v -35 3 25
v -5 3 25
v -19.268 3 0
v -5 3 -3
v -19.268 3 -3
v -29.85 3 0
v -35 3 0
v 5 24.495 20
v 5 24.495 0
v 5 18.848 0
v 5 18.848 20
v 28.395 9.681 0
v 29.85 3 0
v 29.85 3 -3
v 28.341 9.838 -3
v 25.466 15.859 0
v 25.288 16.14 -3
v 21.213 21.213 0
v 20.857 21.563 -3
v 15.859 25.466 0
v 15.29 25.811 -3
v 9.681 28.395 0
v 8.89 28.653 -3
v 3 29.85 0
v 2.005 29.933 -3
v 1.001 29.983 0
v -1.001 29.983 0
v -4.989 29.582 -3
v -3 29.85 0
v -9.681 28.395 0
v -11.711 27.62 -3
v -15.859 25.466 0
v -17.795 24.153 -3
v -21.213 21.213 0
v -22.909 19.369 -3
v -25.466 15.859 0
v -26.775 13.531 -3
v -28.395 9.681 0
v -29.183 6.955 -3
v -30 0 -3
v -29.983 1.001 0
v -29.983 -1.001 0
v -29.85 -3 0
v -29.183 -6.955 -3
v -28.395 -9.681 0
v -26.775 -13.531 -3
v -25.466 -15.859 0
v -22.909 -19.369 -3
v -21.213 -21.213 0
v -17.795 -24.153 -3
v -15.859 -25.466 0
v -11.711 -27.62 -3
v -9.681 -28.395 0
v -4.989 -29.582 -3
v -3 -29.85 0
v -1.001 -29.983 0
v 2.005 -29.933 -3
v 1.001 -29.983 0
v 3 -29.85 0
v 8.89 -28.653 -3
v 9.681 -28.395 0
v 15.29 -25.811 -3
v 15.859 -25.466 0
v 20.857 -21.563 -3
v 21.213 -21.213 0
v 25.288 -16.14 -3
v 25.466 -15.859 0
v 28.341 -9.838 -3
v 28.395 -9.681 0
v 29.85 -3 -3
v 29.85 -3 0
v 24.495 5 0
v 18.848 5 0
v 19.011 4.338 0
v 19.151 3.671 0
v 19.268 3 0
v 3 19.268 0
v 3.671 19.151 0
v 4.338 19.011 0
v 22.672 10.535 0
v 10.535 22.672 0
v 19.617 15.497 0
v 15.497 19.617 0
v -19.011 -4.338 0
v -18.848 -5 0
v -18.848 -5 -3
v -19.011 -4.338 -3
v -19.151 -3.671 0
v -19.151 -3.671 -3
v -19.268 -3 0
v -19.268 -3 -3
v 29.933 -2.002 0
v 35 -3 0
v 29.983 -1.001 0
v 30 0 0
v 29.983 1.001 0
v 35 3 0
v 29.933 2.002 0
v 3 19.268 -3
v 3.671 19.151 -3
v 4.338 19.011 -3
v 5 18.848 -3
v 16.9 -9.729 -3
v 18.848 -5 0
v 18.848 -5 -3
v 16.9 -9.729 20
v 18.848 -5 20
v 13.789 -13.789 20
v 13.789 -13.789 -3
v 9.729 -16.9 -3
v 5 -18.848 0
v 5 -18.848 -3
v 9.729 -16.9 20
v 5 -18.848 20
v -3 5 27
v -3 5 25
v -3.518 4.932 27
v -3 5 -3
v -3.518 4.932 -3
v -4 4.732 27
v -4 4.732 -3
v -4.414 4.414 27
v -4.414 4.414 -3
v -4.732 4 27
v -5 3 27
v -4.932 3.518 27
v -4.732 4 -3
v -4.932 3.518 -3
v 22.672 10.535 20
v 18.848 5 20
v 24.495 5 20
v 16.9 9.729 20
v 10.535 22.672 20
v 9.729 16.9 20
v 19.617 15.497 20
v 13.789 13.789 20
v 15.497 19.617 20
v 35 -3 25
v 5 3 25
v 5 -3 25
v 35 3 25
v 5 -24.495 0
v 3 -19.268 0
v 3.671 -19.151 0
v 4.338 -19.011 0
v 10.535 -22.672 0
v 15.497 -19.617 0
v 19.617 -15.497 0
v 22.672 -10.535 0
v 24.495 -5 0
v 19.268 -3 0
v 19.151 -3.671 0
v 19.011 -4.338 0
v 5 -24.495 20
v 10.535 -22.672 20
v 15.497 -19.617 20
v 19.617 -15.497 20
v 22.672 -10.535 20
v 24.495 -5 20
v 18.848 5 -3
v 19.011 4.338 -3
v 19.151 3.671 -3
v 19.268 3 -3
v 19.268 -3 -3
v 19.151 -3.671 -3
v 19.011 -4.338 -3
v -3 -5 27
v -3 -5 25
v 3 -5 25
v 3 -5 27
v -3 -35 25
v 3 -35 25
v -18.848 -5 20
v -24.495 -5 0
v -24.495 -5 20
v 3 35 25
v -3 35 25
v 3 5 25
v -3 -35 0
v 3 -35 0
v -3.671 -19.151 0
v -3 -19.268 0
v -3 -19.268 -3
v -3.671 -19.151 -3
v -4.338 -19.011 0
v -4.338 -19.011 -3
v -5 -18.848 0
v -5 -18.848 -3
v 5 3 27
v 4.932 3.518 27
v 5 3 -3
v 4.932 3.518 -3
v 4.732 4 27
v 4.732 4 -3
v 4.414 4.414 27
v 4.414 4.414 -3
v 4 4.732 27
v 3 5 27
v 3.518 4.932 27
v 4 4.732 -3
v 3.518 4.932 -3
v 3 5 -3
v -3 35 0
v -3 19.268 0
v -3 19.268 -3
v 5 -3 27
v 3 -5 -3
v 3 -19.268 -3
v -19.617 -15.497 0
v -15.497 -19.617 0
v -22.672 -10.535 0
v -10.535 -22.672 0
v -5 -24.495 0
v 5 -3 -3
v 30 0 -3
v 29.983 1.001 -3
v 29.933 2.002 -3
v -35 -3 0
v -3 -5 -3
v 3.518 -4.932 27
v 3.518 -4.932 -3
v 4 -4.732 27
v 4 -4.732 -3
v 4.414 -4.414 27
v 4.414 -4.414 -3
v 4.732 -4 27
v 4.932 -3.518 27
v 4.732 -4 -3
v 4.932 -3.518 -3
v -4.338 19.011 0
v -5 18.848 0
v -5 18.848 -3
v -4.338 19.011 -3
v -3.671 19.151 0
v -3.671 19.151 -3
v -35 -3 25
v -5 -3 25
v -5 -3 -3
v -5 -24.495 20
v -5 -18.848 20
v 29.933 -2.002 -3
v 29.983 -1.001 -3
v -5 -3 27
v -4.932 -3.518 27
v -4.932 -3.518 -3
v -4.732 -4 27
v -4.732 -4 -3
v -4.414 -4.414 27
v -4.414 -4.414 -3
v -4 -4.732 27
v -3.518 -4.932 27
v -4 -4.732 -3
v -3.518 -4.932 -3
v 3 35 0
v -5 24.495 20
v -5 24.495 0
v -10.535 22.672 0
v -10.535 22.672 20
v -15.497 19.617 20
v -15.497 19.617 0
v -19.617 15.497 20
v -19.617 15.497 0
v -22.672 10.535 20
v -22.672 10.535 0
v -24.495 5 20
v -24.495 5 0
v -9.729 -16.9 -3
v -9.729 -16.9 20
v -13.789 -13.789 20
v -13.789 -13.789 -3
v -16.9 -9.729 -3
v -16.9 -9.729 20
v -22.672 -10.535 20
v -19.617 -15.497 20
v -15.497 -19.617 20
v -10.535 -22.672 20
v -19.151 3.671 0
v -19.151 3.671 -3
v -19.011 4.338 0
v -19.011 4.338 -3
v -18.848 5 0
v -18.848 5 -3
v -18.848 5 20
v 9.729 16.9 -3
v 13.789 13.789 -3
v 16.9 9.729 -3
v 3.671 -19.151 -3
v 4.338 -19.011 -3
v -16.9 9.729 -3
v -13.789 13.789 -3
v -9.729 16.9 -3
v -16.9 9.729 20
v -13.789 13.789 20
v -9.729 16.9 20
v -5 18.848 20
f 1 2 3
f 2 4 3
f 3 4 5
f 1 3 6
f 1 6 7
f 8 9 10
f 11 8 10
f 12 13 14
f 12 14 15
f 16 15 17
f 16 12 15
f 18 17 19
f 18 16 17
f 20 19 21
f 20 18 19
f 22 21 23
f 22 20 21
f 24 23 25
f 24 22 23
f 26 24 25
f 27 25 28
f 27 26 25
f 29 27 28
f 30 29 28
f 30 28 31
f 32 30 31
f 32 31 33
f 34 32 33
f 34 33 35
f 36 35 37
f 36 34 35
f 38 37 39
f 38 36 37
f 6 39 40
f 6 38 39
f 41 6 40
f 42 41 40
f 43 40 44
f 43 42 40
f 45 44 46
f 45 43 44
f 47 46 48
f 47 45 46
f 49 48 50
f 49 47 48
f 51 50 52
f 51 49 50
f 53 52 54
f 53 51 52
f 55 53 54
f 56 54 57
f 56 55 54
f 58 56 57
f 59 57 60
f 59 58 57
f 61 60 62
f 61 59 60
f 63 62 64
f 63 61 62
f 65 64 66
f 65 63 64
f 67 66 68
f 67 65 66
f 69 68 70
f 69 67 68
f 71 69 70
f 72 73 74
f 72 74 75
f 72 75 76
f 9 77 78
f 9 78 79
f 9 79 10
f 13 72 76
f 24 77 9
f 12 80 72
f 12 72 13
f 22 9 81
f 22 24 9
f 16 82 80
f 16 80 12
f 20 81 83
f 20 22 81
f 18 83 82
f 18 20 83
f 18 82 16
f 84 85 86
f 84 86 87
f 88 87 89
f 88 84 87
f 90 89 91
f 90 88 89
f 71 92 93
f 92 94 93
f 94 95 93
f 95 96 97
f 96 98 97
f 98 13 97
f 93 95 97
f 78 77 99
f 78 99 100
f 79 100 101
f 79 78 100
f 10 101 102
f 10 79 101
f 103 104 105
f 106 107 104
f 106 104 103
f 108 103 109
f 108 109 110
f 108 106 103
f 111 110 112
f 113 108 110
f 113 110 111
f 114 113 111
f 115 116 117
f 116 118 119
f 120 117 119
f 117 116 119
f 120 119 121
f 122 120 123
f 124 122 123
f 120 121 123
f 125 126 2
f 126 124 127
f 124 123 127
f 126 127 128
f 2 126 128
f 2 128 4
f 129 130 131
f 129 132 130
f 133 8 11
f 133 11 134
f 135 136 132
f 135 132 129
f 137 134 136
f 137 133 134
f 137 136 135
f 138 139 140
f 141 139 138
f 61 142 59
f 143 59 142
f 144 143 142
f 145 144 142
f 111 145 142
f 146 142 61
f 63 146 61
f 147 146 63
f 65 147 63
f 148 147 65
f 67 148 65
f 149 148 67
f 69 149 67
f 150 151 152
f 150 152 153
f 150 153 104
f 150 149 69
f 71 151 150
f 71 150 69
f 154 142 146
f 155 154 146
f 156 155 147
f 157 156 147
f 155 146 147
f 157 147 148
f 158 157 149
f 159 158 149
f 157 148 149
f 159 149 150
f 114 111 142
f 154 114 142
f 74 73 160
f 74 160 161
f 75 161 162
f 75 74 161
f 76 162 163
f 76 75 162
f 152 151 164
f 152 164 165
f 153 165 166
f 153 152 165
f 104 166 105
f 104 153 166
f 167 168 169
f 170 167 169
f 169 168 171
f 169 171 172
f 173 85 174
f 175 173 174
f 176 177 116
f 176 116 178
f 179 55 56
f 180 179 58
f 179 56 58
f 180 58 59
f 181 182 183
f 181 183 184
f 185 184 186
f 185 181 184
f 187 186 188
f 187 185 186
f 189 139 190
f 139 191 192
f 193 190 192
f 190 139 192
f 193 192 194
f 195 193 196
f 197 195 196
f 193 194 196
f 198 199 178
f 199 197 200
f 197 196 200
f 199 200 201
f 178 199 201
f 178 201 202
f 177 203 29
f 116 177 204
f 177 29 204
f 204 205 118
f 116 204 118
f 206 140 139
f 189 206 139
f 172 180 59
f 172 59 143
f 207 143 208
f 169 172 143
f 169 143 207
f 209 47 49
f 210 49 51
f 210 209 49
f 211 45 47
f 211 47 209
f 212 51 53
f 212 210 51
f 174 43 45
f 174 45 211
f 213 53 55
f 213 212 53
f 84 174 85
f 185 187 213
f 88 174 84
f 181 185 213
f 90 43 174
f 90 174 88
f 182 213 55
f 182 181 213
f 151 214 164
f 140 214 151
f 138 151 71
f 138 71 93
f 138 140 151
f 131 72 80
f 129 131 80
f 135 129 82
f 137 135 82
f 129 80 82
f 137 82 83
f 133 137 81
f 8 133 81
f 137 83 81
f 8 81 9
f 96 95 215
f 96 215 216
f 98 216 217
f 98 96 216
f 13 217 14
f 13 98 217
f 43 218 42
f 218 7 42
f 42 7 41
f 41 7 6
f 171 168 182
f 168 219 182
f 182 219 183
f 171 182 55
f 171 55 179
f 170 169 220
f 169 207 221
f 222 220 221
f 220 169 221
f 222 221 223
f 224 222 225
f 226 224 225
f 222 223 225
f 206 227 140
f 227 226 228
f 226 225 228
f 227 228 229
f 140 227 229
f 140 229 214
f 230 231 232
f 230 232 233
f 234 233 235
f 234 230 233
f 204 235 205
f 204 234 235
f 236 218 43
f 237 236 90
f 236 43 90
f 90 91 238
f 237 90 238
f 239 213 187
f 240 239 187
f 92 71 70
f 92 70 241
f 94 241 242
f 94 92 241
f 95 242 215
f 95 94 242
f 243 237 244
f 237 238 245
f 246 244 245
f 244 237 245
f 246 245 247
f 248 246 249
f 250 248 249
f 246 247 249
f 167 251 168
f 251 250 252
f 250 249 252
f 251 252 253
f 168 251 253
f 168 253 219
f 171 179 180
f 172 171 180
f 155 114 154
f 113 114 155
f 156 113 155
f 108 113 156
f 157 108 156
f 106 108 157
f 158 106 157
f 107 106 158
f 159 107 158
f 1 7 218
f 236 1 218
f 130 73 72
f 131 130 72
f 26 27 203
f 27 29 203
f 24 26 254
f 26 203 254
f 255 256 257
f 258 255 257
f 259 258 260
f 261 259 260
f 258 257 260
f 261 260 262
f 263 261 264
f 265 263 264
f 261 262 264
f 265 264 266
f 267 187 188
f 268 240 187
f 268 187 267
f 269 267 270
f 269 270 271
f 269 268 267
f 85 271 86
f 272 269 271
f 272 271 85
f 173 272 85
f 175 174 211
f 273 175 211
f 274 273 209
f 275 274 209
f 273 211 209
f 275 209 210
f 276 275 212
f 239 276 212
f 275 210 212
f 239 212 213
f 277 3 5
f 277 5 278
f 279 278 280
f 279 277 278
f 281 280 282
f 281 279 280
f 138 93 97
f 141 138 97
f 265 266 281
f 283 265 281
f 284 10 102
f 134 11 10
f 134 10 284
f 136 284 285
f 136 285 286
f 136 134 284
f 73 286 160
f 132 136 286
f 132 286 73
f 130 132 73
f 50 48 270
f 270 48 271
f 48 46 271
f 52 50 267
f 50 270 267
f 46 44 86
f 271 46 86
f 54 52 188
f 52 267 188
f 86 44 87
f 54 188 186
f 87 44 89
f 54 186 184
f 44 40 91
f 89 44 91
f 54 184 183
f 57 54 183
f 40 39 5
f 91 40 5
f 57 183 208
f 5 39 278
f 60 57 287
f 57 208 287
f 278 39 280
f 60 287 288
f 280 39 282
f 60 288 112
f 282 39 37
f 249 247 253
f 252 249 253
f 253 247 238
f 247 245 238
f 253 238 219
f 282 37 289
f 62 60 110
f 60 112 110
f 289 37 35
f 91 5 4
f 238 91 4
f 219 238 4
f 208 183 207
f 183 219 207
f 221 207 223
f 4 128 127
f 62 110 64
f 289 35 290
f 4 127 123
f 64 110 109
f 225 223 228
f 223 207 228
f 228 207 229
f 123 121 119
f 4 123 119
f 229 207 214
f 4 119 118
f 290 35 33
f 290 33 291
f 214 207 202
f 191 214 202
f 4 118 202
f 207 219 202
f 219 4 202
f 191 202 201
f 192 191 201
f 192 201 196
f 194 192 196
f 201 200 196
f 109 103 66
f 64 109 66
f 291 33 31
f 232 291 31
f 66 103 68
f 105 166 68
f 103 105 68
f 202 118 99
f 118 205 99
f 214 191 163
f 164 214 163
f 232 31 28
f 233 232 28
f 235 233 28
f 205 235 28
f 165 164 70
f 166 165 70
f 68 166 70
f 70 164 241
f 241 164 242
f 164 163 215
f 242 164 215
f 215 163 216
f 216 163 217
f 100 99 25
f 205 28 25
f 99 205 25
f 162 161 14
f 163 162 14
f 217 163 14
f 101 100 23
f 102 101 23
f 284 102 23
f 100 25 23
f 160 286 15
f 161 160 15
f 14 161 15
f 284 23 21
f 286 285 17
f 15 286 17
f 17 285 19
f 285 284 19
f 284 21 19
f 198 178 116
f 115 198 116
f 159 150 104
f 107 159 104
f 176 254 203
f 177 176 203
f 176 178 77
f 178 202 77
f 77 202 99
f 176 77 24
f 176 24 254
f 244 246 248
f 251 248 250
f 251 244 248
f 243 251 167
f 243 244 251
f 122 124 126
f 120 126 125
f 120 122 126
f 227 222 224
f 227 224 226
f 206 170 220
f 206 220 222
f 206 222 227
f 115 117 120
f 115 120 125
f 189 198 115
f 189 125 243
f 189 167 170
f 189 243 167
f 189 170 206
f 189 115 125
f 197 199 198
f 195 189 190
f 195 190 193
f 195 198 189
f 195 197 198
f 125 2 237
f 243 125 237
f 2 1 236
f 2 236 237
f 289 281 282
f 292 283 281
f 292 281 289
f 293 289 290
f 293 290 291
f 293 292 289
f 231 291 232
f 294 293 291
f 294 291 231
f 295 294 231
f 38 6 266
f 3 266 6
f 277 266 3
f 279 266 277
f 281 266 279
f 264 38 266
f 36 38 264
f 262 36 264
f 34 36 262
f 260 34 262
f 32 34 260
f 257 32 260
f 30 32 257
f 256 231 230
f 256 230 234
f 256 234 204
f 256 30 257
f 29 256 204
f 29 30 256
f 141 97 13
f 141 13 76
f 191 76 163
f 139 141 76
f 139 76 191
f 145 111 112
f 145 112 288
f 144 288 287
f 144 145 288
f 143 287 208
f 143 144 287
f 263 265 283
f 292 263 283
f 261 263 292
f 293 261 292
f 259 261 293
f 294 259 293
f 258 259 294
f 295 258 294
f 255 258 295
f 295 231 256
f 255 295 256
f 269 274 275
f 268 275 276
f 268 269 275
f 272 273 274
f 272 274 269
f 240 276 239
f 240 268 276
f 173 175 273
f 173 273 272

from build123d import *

# Parameters (mm, degrees)
F1_DEPTH = 3
F2_DEPTH = 20
F3_DEPTH = 25
F4_DEPTH = 27


with BuildPart() as f1:
    # F0 (on Top) → F1 (new body)
    with BuildSketch(Plane.XY):
        with BuildLine():
            Line((29.8496231132, -3), (24.819347292, -3))
            ThreePointArc((24.819347292, -3), (24.6773921449, -4.0032882645), (24.4948974278, -5))
            ThreePointArc((24.4948974278, -5), (17.6776695297, -17.6776695297), (5, -24.4948974278))
            ThreePointArc((5, -24.4948974278), (4.0032882645, -24.6773921449), (3, -24.819347292))
            Line((3, -24.819347292), (3, -29.8496231132))
            ThreePointArc((3, -29.8496231132), (21.2132034356, -21.2132034356), (29.8496231132, -3))
        make_face()
        with BuildLine():
            ThreePointArc((5, -24.4948974278), (17.6776695297, -17.6776695297), (24.4948974278, -5))
            Line((24.4948974278, -5), (18.848076825, -5))
            ThreePointArc((18.848076825, -5), (13.7885822331, -13.7885822331), (5, -18.848076825))
            Line((5, -18.848076825), (5, -24.4948974278))
        make_face()
        with BuildLine():
            ThreePointArc((24.4948974278, -5), (24.6773921449, -4.0032882645), (24.819347292, -3))
            Line((24.819347292, -3), (19.267848868, -3))
            ThreePointArc((19.267848868, -3), (19.0841805655, -4.0055027327), (18.848076825, -5))
            Line((18.848076825, -5), (24.4948974278, -5))
        make_face()
        with BuildLine():
            ThreePointArc((25, 0), (24.9547959549, 1.5027171558), (24.819347292, 3))
            Line((24.819347292, 3), (19.267848868, 3))
            ThreePointArc((19.267848868, 3), (19.4418755902, 1.5044844755), (19.5, 0))
            ThreePointArc((19.5, 0), (19.4418755902, -1.5044844755), (19.267848868, -3))
            Line((19.267848868, -3), (24.819347292, -3))
            ThreePointArc((24.819347292, -3), (24.9547959549, -1.5027171558), (25, 0))
        make_face()
        with BuildLine():
            ThreePointArc((24.819347292, 3), (24.6773921449, 4.0032882645), (24.4948974278, 5))
            Line((24.4948974278, 5), (18.848076825, 5))
            ThreePointArc((18.848076825, 5), (19.0841805655, 4.0055027327), (19.267848868, 3))
            Line((19.267848868, 3), (24.819347292, 3))
        make_face()
        with BuildLine():
            Line((18.848076825, 5), (24.4948974278, 5))
            ThreePointArc((24.4948974278, 5), (17.6776695297, 17.6776695297), (5, 24.4948974278))
            Line((5, 24.4948974278), (5, 18.848076825))
            ThreePointArc((5, 18.848076825), (13.7885822331, 13.7885822331), (18.848076825, 5))
        make_face()
        with BuildLine():
            ThreePointArc((5, 24.4948974278), (17.6776695297, 17.6776695297), (24.4948974278, 5))
            ThreePointArc((24.4948974278, 5), (24.6773921449, 4.0032882645), (24.819347292, 3))
            Line((24.819347292, 3), (29.8496231132, 3))
            ThreePointArc((29.8496231132, 3), (21.2132034356, 21.2132034356), (3, 29.8496231132))
            Line((3, 29.8496231132), (3, 24.819347292))
            ThreePointArc((3, 24.819347292), (4.0032882645, 24.6773921449), (5, 24.4948974278))
        make_face()
        with BuildLine():
            Line((29.8496231132, 3), (24.819347292, 3))
            ThreePointArc((24.819347292, 3), (24.9547959549, 1.5027171558), (25, 0))
            ThreePointArc((25, 0), (24.9547959549, -1.5027171558), (24.819347292, -3))
            Line((24.819347292, -3), (29.8496231132, -3))
            ThreePointArc((29.8496231132, -3), (29.9623821933, -1.5018832518), (30, 0))
            ThreePointArc((30, 0), (29.9623821933, 1.5018832518), (29.8496231132, 3))
        make_face()
        with BuildLine():
            ThreePointArc((-3, -29.8496231132), (0, -30), (3, -29.8496231132))
            Line((3, -29.8496231132), (3, -24.819347292))
            ThreePointArc((3, -24.819347292), (0, -25), (-3, -24.819347292))
            Line((-3, -24.819347292), (-3, -29.8496231132))
        make_face()
        with BuildLine():
            ThreePointArc((-3, -24.819347292), (0, -25), (3, -24.819347292))
            Line((3, -24.819347292), (3, -19.267848868))
            ThreePointArc((3, -19.267848868), (0, -19.5), (-3, -19.267848868))
            Line((-3, -19.267848868), (-3, -24.819347292))
        make_face()
        with BuildLine():
            ThreePointArc((3, -24.819347292), (4.0032882645, -24.6773921449), (5, -24.4948974278))
            Line((5, -24.4948974278), (5, -18.848076825))
            ThreePointArc((5, -18.848076825), (4.0055027327, -19.0841805655), (3, -19.267848868))
            Line((3, -19.267848868), (3, -24.819347292))
        make_face()
        with BuildLine():
            ThreePointArc((-5, -24.4948974278), (-4.0032882645, -24.6773921449), (-3, -24.819347292))
            Line((-3, -24.819347292), (-3, -19.267848868))
            ThreePointArc((-3, -19.267848868), (-4.0055027327, -19.0841805655), (-5, -18.848076825))
            Line((-5, -18.848076825), (-5, -24.4948974278))
        make_face()
        with BuildLine():
            Line((-24.819347292, -3), (-29.8496231132, -3))
            ThreePointArc((-29.8496231132, -3), (-21.2132034356, -21.2132034356), (-3, -29.8496231132))
            Line((-3, -29.8496231132), (-3, -24.819347292))
            ThreePointArc((-3, -24.819347292), (-4.0032882645, -24.6773921449), (-5, -24.4948974278))
            ThreePointArc((-5, -24.4948974278), (-17.6776695297, -17.6776695297), (-24.4948974278, -5))
            ThreePointArc((-24.4948974278, -5), (-24.6773921449, -4.0032882645), (-24.819347292, -3))
        make_face()
        with BuildLine():
            Line((-18.848076825, -5), (-24.4948974278, -5))
            ThreePointArc((-24.4948974278, -5), (-17.6776695297, -17.6776695297), (-5, -24.4948974278))
            Line((-5, -24.4948974278), (-5, -18.848076825))
            ThreePointArc((-5, -18.848076825), (-13.7885822331, -13.7885822331), (-18.848076825, -5))
        make_face()
        with BuildLine():
            Line((-19.267848868, -3), (-24.819347292, -3))
            ThreePointArc((-24.819347292, -3), (-24.6773921449, -4.0032882645), (-24.4948974278, -5))
            Line((-24.4948974278, -5), (-18.848076825, -5))
            ThreePointArc((-18.848076825, -5), (-19.0841805655, -4.0055027327), (-19.267848868, -3))
        make_face()
        with BuildLine():
            Line((-19.267848868, 3), (-24.819347292, 3))
            ThreePointArc((-24.819347292, 3), (-25, 0), (-24.819347292, -3))
            Line((-24.819347292, -3), (-19.267848868, -3))
            ThreePointArc((-19.267848868, -3), (-19.5, 0), (-19.267848868, 3))
        make_face()
        with BuildLine():
            Line((-18.848076825, 5), (-24.4948974278, 5))
            ThreePointArc((-24.4948974278, 5), (-24.6773921449, 4.0032882645), (-24.819347292, 3))
            Line((-24.819347292, 3), (-19.267848868, 3))
            ThreePointArc((-19.267848868, 3), (-19.0841805655, 4.0055027327), (-18.848076825, 5))
        make_face()
        with BuildLine():
            ThreePointArc((-5, 24.4948974278), (-4.0032882645, 24.6773921449), (-3, 24.819347292))
            Line((-3, 24.819347292), (-3, 29.8496231132))
            ThreePointArc((-3, 29.8496231132), (-21.2132034356, 21.2132034356), (-29.8496231132, 3))
            Line((-29.8496231132, 3), (-24.819347292, 3))
            ThreePointArc((-24.819347292, 3), (-24.6773921449, 4.0032882645), (-24.4948974278, 5))
            ThreePointArc((-24.4948974278, 5), (-17.6776695297, 17.6776695297), (-5, 24.4948974278))
        make_face()
        with BuildLine():
            Line((-5, 18.848076825), (-5, 24.4948974278))
            ThreePointArc((-5, 24.4948974278), (-17.6776695297, 17.6776695297), (-24.4948974278, 5))
            Line((-24.4948974278, 5), (-18.848076825, 5))
            ThreePointArc((-18.848076825, 5), (-13.7885822331, 13.7885822331), (-5, 18.848076825))
        make_face()
        with BuildLine():
            Line((-3, 19.267848868), (-3, 24.819347292))
            ThreePointArc((-3, 24.819347292), (-4.0032882645, 24.6773921449), (-5, 24.4948974278))
            Line((-5, 24.4948974278), (-5, 18.848076825))
            ThreePointArc((-5, 18.848076825), (-4.0055027327, 19.0841805655), (-3, 19.267848868))
        make_face()
        with BuildLine():
            Line((3, 19.267848868), (3, 24.819347292))
            ThreePointArc((3, 24.819347292), (0, 25), (-3, 24.819347292))
            Line((-3, 24.819347292), (-3, 19.267848868))
            ThreePointArc((-3, 19.267848868), (0, 19.5), (3, 19.267848868))
        make_face()
        with BuildLine():
            Line((5, 18.848076825), (5, 24.4948974278))
            ThreePointArc((5, 24.4948974278), (4.0032882645, 24.6773921449), (3, 24.819347292))
            Line((3, 24.819347292), (3, 19.267848868))
            ThreePointArc((3, 19.267848868), (4.0055027327, 19.0841805655), (5, 18.848076825))
        make_face()
        with BuildLine():
            ThreePointArc((-3, 24.819347292), (0, 25), (3, 24.819347292))
            Line((3, 24.819347292), (3, 29.8496231132))
            ThreePointArc((3, 29.8496231132), (0, 30), (-3, 29.8496231132))
            Line((-3, 29.8496231132), (-3, 24.819347292))
        make_face()
        with BuildLine():
            Line((-24.819347292, 3), (-29.8496231132, 3))
            ThreePointArc((-29.8496231132, 3), (-30, 0), (-29.8496231132, -3))
            Line((-29.8496231132, -3), (-24.819347292, -3))
            ThreePointArc((-24.819347292, -3), (-25, 0), (-24.819347292, 3))
        make_face()
        with BuildLine():
            Line((3, -19.267848868), (3, -5))
            Line((3, -5), (-3, -5))
            Line((-3, -5), (-3, -19.267848868))
            ThreePointArc((-3, -19.267848868), (0, -19.5), (3, -19.267848868))
        make_face()
        with BuildLine():
            ThreePointArc((19.5, 0), (19.4418755902, 1.5044844755), (19.267848868, 3))
            Line((19.267848868, 3), (5, 3))
            Line((5, 3), (5, -3))
            Line((5, -3), (19.267848868, -3))
            ThreePointArc((19.267848868, -3), (19.4418755902, -1.5044844755), (19.5, 0))
        make_face()
        with BuildLine():
            Line((3, 5), (3, 19.267848868))
            ThreePointArc((3, 19.267848868), (0, 19.5), (-3, 19.267848868))
            Line((-3, 19.267848868), (-3, 5))
            Line((-3, 5), (3, 5))
        make_face()
        with BuildLine():
            Line((-5, -3), (-5, 3))
            Line((-5, 3), (-19.267848868, 3))
            ThreePointArc((-19.267848868, 3), (-19.5, 0), (-19.267848868, -3))
            Line((-19.267848868, -3), (-5, -3))
        make_face()
        with BuildLine():
            Line((5, -3), (5, 3))
            ThreePointArc((5, 3), (4.4142135624, 4.4142135624), (3, 5))
            Line((3, 5), (-3, 5))
            ThreePointArc((-3, 5), (-4.4142135624, 4.4142135624), (-5, 3))
            Line((-5, 3), (-5, -3))
            ThreePointArc((-5, -3), (-4.4142135624, -4.4142135624), (-3, -5))
            Line((-3, -5), (3, -5))
            ThreePointArc((3, -5), (4.4142135624, -4.4142135624), (5, -3))
        make_face()
    extrude(amount=-F1_DEPTH)

    # F0 (on Top) → F2 (join)
    with BuildSketch(Plane.XY):
        with BuildLine():
            Line((-5, 18.848076825), (-5, 24.4948974278))
            ThreePointArc((-5, 24.4948974278), (-17.6776695297, 17.6776695297), (-24.4948974278, 5))
            Line((-24.4948974278, 5), (-18.848076825, 5))
            ThreePointArc((-18.848076825, 5), (-13.7885822331, 13.7885822331), (-5, 18.848076825))
        make_face()
        with BuildLine():
            Line((18.848076825, 5), (24.4948974278, 5))
            ThreePointArc((24.4948974278, 5), (17.6776695297, 17.6776695297), (5, 24.4948974278))
            Line((5, 24.4948974278), (5, 18.848076825))
            ThreePointArc((5, 18.848076825), (13.7885822331, 13.7885822331), (18.848076825, 5))
        make_face()
        with BuildLine():
            ThreePointArc((5, -24.4948974278), (17.6776695297, -17.6776695297), (24.4948974278, -5))
            Line((24.4948974278, -5), (18.848076825, -5))
            ThreePointArc((18.848076825, -5), (13.7885822331, -13.7885822331), (5, -18.848076825))
            Line((5, -18.848076825), (5, -24.4948974278))
        make_face()
        with BuildLine():
            Line((-18.848076825, -5), (-24.4948974278, -5))
            ThreePointArc((-24.4948974278, -5), (-17.6776695297, -17.6776695297), (-5, -24.4948974278))
            Line((-5, -24.4948974278), (-5, -18.848076825))
            ThreePointArc((-5, -18.848076825), (-13.7885822331, -13.7885822331), (-18.848076825, -5))
        make_face()
    extrude(amount=F2_DEPTH)

    # F0 (on Top) → F3 (join)
    with BuildSketch(Plane.XY):
        with BuildLine():
            Line((-5, -3), (-5, 3))
            Line((-5, 3), (-19.267848868, 3))
            ThreePointArc((-19.267848868, 3), (-19.5, 0), (-19.267848868, -3))
            Line((-19.267848868, -3), (-5, -3))
        make_face()
        with BuildLine():
            Line((-19.267848868, 3), (-24.819347292, 3))
            ThreePointArc((-24.819347292, 3), (-25, 0), (-24.819347292, -3))
            Line((-24.819347292, -3), (-19.267848868, -3))
            ThreePointArc((-19.267848868, -3), (-19.5, 0), (-19.267848868, 3))
        make_face()
        with BuildLine():
            Line((-24.819347292, 3), (-29.8496231132, 3))
            ThreePointArc((-29.8496231132, 3), (-30, 0), (-29.8496231132, -3))
            Line((-29.8496231132, -3), (-24.819347292, -3))
            ThreePointArc((-24.819347292, -3), (-25, 0), (-24.819347292, 3))
        make_face()
        with BuildLine():
            ThreePointArc((-29.8496231132, -3), (-30, 0), (-29.8496231132, 3))
            Line((-29.8496231132, 3), (-35, 3))
            Line((-35, 3), (-35, -3))
            Line((-35, -3), (-29.8496231132, -3))
        make_face()
        with BuildLine():
            Line((3, -35), (3, -29.8496231132))
            ThreePointArc((3, -29.8496231132), (0, -30), (-3, -29.8496231132))
            Line((-3, -29.8496231132), (-3, -35))
            Line((-3, -35), (3, -35))
        make_face()
        with BuildLine():
            ThreePointArc((-3, -29.8496231132), (0, -30), (3, -29.8496231132))
            Line((3, -29.8496231132), (3, -24.819347292))
            ThreePointArc((3, -24.819347292), (0, -25), (-3, -24.819347292))
            Line((-3, -24.819347292), (-3, -29.8496231132))
        make_face()
        with BuildLine():
            ThreePointArc((-3, -24.819347292), (0, -25), (3, -24.819347292))
            Line((3, -24.819347292), (3, -19.267848868))
            ThreePointArc((3, -19.267848868), (0, -19.5), (-3, -19.267848868))
            Line((-3, -19.267848868), (-3, -24.819347292))
        make_face()
        with BuildLine():
            Line((3, -19.267848868), (3, -5))
            Line((3, -5), (-3, -5))
            Line((-3, -5), (-3, -19.267848868))
            ThreePointArc((-3, -19.267848868), (0, -19.5), (3, -19.267848868))
        make_face()
        with BuildLine():
            ThreePointArc((19.5, 0), (19.4418755902, 1.5044844755), (19.267848868, 3))
            Line((19.267848868, 3), (5, 3))
            Line((5, 3), (5, -3))
            Line((5, -3), (19.267848868, -3))
            ThreePointArc((19.267848868, -3), (19.4418755902, -1.5044844755), (19.5, 0))
        make_face()
        with BuildLine():
            ThreePointArc((25, 0), (24.9547959549, 1.5027171558), (24.819347292, 3))
            Line((24.819347292, 3), (19.267848868, 3))
            ThreePointArc((19.267848868, 3), (19.4418755902, 1.5044844755), (19.5, 0))
            ThreePointArc((19.5, 0), (19.4418755902, -1.5044844755), (19.267848868, -3))
            Line((19.267848868, -3), (24.819347292, -3))
            ThreePointArc((24.819347292, -3), (24.9547959549, -1.5027171558), (25, 0))
        make_face()
        with BuildLine():
            Line((29.8496231132, 3), (24.819347292, 3))
            ThreePointArc((24.819347292, 3), (24.9547959549, 1.5027171558), (25, 0))
            ThreePointArc((25, 0), (24.9547959549, -1.5027171558), (24.819347292, -3))
            Line((24.819347292, -3), (29.8496231132, -3))
            ThreePointArc((29.8496231132, -3), (29.9623821933, -1.5018832518), (30, 0))
            ThreePointArc((30, 0), (29.9623821933, 1.5018832518), (29.8496231132, 3))
        make_face()
        with BuildLine():
            Line((35, 3), (29.8496231132, 3))
            ThreePointArc((29.8496231132, 3), (29.9623821933, 1.5018832518), (30, 0))
            ThreePointArc((30, 0), (29.9623821933, -1.5018832518), (29.8496231132, -3))
            Line((29.8496231132, -3), (35, -3))
            Line((35, -3), (35, 3))
        make_face()
        with BuildLine():
            Line((3, 5), (3, 19.267848868))
            ThreePointArc((3, 19.267848868), (0, 19.5), (-3, 19.267848868))
            Line((-3, 19.267848868), (-3, 5))
            Line((-3, 5), (3, 5))
        make_face()
        with BuildLine():
            Line((3, 19.267848868), (3, 24.819347292))
            ThreePointArc((3, 24.819347292), (0, 25), (-3, 24.819347292))
            Line((-3, 24.819347292), (-3, 19.267848868))
            ThreePointArc((-3, 19.267848868), (0, 19.5), (3, 19.267848868))
        make_face()
        with BuildLine():
            ThreePointArc((-3, 24.819347292), (0, 25), (3, 24.819347292))
            Line((3, 24.819347292), (3, 29.8496231132))
            ThreePointArc((3, 29.8496231132), (0, 30), (-3, 29.8496231132))
            Line((-3, 29.8496231132), (-3, 24.819347292))
        make_face()
        with BuildLine():
            ThreePointArc((-3, 29.8496231132), (0, 30), (3, 29.8496231132))
            Line((3, 29.8496231132), (3, 35))
            Line((3, 35), (-3, 35))
            Line((-3, 35), (-3, 29.8496231132))
        make_face()
    extrude(amount=F3_DEPTH)

    # F0 (on Top) → F4 (join)
    with BuildSketch(Plane.XY):
        with BuildLine():
            Line((5, -3), (5, 3))
            ThreePointArc((5, 3), (4.4142135624, 4.4142135624), (3, 5))
            Line((3, 5), (-3, 5))
            ThreePointArc((-3, 5), (-4.4142135624, 4.4142135624), (-5, 3))
            Line((-5, 3), (-5, -3))
            ThreePointArc((-5, -3), (-4.4142135624, -4.4142135624), (-3, -5))
            Line((-3, -5), (3, -5))
            ThreePointArc((3, -5), (4.4142135624, -4.4142135624), (5, -3))
        make_face()
    extrude(amount=F4_DEPTH)


solid = f1.part
